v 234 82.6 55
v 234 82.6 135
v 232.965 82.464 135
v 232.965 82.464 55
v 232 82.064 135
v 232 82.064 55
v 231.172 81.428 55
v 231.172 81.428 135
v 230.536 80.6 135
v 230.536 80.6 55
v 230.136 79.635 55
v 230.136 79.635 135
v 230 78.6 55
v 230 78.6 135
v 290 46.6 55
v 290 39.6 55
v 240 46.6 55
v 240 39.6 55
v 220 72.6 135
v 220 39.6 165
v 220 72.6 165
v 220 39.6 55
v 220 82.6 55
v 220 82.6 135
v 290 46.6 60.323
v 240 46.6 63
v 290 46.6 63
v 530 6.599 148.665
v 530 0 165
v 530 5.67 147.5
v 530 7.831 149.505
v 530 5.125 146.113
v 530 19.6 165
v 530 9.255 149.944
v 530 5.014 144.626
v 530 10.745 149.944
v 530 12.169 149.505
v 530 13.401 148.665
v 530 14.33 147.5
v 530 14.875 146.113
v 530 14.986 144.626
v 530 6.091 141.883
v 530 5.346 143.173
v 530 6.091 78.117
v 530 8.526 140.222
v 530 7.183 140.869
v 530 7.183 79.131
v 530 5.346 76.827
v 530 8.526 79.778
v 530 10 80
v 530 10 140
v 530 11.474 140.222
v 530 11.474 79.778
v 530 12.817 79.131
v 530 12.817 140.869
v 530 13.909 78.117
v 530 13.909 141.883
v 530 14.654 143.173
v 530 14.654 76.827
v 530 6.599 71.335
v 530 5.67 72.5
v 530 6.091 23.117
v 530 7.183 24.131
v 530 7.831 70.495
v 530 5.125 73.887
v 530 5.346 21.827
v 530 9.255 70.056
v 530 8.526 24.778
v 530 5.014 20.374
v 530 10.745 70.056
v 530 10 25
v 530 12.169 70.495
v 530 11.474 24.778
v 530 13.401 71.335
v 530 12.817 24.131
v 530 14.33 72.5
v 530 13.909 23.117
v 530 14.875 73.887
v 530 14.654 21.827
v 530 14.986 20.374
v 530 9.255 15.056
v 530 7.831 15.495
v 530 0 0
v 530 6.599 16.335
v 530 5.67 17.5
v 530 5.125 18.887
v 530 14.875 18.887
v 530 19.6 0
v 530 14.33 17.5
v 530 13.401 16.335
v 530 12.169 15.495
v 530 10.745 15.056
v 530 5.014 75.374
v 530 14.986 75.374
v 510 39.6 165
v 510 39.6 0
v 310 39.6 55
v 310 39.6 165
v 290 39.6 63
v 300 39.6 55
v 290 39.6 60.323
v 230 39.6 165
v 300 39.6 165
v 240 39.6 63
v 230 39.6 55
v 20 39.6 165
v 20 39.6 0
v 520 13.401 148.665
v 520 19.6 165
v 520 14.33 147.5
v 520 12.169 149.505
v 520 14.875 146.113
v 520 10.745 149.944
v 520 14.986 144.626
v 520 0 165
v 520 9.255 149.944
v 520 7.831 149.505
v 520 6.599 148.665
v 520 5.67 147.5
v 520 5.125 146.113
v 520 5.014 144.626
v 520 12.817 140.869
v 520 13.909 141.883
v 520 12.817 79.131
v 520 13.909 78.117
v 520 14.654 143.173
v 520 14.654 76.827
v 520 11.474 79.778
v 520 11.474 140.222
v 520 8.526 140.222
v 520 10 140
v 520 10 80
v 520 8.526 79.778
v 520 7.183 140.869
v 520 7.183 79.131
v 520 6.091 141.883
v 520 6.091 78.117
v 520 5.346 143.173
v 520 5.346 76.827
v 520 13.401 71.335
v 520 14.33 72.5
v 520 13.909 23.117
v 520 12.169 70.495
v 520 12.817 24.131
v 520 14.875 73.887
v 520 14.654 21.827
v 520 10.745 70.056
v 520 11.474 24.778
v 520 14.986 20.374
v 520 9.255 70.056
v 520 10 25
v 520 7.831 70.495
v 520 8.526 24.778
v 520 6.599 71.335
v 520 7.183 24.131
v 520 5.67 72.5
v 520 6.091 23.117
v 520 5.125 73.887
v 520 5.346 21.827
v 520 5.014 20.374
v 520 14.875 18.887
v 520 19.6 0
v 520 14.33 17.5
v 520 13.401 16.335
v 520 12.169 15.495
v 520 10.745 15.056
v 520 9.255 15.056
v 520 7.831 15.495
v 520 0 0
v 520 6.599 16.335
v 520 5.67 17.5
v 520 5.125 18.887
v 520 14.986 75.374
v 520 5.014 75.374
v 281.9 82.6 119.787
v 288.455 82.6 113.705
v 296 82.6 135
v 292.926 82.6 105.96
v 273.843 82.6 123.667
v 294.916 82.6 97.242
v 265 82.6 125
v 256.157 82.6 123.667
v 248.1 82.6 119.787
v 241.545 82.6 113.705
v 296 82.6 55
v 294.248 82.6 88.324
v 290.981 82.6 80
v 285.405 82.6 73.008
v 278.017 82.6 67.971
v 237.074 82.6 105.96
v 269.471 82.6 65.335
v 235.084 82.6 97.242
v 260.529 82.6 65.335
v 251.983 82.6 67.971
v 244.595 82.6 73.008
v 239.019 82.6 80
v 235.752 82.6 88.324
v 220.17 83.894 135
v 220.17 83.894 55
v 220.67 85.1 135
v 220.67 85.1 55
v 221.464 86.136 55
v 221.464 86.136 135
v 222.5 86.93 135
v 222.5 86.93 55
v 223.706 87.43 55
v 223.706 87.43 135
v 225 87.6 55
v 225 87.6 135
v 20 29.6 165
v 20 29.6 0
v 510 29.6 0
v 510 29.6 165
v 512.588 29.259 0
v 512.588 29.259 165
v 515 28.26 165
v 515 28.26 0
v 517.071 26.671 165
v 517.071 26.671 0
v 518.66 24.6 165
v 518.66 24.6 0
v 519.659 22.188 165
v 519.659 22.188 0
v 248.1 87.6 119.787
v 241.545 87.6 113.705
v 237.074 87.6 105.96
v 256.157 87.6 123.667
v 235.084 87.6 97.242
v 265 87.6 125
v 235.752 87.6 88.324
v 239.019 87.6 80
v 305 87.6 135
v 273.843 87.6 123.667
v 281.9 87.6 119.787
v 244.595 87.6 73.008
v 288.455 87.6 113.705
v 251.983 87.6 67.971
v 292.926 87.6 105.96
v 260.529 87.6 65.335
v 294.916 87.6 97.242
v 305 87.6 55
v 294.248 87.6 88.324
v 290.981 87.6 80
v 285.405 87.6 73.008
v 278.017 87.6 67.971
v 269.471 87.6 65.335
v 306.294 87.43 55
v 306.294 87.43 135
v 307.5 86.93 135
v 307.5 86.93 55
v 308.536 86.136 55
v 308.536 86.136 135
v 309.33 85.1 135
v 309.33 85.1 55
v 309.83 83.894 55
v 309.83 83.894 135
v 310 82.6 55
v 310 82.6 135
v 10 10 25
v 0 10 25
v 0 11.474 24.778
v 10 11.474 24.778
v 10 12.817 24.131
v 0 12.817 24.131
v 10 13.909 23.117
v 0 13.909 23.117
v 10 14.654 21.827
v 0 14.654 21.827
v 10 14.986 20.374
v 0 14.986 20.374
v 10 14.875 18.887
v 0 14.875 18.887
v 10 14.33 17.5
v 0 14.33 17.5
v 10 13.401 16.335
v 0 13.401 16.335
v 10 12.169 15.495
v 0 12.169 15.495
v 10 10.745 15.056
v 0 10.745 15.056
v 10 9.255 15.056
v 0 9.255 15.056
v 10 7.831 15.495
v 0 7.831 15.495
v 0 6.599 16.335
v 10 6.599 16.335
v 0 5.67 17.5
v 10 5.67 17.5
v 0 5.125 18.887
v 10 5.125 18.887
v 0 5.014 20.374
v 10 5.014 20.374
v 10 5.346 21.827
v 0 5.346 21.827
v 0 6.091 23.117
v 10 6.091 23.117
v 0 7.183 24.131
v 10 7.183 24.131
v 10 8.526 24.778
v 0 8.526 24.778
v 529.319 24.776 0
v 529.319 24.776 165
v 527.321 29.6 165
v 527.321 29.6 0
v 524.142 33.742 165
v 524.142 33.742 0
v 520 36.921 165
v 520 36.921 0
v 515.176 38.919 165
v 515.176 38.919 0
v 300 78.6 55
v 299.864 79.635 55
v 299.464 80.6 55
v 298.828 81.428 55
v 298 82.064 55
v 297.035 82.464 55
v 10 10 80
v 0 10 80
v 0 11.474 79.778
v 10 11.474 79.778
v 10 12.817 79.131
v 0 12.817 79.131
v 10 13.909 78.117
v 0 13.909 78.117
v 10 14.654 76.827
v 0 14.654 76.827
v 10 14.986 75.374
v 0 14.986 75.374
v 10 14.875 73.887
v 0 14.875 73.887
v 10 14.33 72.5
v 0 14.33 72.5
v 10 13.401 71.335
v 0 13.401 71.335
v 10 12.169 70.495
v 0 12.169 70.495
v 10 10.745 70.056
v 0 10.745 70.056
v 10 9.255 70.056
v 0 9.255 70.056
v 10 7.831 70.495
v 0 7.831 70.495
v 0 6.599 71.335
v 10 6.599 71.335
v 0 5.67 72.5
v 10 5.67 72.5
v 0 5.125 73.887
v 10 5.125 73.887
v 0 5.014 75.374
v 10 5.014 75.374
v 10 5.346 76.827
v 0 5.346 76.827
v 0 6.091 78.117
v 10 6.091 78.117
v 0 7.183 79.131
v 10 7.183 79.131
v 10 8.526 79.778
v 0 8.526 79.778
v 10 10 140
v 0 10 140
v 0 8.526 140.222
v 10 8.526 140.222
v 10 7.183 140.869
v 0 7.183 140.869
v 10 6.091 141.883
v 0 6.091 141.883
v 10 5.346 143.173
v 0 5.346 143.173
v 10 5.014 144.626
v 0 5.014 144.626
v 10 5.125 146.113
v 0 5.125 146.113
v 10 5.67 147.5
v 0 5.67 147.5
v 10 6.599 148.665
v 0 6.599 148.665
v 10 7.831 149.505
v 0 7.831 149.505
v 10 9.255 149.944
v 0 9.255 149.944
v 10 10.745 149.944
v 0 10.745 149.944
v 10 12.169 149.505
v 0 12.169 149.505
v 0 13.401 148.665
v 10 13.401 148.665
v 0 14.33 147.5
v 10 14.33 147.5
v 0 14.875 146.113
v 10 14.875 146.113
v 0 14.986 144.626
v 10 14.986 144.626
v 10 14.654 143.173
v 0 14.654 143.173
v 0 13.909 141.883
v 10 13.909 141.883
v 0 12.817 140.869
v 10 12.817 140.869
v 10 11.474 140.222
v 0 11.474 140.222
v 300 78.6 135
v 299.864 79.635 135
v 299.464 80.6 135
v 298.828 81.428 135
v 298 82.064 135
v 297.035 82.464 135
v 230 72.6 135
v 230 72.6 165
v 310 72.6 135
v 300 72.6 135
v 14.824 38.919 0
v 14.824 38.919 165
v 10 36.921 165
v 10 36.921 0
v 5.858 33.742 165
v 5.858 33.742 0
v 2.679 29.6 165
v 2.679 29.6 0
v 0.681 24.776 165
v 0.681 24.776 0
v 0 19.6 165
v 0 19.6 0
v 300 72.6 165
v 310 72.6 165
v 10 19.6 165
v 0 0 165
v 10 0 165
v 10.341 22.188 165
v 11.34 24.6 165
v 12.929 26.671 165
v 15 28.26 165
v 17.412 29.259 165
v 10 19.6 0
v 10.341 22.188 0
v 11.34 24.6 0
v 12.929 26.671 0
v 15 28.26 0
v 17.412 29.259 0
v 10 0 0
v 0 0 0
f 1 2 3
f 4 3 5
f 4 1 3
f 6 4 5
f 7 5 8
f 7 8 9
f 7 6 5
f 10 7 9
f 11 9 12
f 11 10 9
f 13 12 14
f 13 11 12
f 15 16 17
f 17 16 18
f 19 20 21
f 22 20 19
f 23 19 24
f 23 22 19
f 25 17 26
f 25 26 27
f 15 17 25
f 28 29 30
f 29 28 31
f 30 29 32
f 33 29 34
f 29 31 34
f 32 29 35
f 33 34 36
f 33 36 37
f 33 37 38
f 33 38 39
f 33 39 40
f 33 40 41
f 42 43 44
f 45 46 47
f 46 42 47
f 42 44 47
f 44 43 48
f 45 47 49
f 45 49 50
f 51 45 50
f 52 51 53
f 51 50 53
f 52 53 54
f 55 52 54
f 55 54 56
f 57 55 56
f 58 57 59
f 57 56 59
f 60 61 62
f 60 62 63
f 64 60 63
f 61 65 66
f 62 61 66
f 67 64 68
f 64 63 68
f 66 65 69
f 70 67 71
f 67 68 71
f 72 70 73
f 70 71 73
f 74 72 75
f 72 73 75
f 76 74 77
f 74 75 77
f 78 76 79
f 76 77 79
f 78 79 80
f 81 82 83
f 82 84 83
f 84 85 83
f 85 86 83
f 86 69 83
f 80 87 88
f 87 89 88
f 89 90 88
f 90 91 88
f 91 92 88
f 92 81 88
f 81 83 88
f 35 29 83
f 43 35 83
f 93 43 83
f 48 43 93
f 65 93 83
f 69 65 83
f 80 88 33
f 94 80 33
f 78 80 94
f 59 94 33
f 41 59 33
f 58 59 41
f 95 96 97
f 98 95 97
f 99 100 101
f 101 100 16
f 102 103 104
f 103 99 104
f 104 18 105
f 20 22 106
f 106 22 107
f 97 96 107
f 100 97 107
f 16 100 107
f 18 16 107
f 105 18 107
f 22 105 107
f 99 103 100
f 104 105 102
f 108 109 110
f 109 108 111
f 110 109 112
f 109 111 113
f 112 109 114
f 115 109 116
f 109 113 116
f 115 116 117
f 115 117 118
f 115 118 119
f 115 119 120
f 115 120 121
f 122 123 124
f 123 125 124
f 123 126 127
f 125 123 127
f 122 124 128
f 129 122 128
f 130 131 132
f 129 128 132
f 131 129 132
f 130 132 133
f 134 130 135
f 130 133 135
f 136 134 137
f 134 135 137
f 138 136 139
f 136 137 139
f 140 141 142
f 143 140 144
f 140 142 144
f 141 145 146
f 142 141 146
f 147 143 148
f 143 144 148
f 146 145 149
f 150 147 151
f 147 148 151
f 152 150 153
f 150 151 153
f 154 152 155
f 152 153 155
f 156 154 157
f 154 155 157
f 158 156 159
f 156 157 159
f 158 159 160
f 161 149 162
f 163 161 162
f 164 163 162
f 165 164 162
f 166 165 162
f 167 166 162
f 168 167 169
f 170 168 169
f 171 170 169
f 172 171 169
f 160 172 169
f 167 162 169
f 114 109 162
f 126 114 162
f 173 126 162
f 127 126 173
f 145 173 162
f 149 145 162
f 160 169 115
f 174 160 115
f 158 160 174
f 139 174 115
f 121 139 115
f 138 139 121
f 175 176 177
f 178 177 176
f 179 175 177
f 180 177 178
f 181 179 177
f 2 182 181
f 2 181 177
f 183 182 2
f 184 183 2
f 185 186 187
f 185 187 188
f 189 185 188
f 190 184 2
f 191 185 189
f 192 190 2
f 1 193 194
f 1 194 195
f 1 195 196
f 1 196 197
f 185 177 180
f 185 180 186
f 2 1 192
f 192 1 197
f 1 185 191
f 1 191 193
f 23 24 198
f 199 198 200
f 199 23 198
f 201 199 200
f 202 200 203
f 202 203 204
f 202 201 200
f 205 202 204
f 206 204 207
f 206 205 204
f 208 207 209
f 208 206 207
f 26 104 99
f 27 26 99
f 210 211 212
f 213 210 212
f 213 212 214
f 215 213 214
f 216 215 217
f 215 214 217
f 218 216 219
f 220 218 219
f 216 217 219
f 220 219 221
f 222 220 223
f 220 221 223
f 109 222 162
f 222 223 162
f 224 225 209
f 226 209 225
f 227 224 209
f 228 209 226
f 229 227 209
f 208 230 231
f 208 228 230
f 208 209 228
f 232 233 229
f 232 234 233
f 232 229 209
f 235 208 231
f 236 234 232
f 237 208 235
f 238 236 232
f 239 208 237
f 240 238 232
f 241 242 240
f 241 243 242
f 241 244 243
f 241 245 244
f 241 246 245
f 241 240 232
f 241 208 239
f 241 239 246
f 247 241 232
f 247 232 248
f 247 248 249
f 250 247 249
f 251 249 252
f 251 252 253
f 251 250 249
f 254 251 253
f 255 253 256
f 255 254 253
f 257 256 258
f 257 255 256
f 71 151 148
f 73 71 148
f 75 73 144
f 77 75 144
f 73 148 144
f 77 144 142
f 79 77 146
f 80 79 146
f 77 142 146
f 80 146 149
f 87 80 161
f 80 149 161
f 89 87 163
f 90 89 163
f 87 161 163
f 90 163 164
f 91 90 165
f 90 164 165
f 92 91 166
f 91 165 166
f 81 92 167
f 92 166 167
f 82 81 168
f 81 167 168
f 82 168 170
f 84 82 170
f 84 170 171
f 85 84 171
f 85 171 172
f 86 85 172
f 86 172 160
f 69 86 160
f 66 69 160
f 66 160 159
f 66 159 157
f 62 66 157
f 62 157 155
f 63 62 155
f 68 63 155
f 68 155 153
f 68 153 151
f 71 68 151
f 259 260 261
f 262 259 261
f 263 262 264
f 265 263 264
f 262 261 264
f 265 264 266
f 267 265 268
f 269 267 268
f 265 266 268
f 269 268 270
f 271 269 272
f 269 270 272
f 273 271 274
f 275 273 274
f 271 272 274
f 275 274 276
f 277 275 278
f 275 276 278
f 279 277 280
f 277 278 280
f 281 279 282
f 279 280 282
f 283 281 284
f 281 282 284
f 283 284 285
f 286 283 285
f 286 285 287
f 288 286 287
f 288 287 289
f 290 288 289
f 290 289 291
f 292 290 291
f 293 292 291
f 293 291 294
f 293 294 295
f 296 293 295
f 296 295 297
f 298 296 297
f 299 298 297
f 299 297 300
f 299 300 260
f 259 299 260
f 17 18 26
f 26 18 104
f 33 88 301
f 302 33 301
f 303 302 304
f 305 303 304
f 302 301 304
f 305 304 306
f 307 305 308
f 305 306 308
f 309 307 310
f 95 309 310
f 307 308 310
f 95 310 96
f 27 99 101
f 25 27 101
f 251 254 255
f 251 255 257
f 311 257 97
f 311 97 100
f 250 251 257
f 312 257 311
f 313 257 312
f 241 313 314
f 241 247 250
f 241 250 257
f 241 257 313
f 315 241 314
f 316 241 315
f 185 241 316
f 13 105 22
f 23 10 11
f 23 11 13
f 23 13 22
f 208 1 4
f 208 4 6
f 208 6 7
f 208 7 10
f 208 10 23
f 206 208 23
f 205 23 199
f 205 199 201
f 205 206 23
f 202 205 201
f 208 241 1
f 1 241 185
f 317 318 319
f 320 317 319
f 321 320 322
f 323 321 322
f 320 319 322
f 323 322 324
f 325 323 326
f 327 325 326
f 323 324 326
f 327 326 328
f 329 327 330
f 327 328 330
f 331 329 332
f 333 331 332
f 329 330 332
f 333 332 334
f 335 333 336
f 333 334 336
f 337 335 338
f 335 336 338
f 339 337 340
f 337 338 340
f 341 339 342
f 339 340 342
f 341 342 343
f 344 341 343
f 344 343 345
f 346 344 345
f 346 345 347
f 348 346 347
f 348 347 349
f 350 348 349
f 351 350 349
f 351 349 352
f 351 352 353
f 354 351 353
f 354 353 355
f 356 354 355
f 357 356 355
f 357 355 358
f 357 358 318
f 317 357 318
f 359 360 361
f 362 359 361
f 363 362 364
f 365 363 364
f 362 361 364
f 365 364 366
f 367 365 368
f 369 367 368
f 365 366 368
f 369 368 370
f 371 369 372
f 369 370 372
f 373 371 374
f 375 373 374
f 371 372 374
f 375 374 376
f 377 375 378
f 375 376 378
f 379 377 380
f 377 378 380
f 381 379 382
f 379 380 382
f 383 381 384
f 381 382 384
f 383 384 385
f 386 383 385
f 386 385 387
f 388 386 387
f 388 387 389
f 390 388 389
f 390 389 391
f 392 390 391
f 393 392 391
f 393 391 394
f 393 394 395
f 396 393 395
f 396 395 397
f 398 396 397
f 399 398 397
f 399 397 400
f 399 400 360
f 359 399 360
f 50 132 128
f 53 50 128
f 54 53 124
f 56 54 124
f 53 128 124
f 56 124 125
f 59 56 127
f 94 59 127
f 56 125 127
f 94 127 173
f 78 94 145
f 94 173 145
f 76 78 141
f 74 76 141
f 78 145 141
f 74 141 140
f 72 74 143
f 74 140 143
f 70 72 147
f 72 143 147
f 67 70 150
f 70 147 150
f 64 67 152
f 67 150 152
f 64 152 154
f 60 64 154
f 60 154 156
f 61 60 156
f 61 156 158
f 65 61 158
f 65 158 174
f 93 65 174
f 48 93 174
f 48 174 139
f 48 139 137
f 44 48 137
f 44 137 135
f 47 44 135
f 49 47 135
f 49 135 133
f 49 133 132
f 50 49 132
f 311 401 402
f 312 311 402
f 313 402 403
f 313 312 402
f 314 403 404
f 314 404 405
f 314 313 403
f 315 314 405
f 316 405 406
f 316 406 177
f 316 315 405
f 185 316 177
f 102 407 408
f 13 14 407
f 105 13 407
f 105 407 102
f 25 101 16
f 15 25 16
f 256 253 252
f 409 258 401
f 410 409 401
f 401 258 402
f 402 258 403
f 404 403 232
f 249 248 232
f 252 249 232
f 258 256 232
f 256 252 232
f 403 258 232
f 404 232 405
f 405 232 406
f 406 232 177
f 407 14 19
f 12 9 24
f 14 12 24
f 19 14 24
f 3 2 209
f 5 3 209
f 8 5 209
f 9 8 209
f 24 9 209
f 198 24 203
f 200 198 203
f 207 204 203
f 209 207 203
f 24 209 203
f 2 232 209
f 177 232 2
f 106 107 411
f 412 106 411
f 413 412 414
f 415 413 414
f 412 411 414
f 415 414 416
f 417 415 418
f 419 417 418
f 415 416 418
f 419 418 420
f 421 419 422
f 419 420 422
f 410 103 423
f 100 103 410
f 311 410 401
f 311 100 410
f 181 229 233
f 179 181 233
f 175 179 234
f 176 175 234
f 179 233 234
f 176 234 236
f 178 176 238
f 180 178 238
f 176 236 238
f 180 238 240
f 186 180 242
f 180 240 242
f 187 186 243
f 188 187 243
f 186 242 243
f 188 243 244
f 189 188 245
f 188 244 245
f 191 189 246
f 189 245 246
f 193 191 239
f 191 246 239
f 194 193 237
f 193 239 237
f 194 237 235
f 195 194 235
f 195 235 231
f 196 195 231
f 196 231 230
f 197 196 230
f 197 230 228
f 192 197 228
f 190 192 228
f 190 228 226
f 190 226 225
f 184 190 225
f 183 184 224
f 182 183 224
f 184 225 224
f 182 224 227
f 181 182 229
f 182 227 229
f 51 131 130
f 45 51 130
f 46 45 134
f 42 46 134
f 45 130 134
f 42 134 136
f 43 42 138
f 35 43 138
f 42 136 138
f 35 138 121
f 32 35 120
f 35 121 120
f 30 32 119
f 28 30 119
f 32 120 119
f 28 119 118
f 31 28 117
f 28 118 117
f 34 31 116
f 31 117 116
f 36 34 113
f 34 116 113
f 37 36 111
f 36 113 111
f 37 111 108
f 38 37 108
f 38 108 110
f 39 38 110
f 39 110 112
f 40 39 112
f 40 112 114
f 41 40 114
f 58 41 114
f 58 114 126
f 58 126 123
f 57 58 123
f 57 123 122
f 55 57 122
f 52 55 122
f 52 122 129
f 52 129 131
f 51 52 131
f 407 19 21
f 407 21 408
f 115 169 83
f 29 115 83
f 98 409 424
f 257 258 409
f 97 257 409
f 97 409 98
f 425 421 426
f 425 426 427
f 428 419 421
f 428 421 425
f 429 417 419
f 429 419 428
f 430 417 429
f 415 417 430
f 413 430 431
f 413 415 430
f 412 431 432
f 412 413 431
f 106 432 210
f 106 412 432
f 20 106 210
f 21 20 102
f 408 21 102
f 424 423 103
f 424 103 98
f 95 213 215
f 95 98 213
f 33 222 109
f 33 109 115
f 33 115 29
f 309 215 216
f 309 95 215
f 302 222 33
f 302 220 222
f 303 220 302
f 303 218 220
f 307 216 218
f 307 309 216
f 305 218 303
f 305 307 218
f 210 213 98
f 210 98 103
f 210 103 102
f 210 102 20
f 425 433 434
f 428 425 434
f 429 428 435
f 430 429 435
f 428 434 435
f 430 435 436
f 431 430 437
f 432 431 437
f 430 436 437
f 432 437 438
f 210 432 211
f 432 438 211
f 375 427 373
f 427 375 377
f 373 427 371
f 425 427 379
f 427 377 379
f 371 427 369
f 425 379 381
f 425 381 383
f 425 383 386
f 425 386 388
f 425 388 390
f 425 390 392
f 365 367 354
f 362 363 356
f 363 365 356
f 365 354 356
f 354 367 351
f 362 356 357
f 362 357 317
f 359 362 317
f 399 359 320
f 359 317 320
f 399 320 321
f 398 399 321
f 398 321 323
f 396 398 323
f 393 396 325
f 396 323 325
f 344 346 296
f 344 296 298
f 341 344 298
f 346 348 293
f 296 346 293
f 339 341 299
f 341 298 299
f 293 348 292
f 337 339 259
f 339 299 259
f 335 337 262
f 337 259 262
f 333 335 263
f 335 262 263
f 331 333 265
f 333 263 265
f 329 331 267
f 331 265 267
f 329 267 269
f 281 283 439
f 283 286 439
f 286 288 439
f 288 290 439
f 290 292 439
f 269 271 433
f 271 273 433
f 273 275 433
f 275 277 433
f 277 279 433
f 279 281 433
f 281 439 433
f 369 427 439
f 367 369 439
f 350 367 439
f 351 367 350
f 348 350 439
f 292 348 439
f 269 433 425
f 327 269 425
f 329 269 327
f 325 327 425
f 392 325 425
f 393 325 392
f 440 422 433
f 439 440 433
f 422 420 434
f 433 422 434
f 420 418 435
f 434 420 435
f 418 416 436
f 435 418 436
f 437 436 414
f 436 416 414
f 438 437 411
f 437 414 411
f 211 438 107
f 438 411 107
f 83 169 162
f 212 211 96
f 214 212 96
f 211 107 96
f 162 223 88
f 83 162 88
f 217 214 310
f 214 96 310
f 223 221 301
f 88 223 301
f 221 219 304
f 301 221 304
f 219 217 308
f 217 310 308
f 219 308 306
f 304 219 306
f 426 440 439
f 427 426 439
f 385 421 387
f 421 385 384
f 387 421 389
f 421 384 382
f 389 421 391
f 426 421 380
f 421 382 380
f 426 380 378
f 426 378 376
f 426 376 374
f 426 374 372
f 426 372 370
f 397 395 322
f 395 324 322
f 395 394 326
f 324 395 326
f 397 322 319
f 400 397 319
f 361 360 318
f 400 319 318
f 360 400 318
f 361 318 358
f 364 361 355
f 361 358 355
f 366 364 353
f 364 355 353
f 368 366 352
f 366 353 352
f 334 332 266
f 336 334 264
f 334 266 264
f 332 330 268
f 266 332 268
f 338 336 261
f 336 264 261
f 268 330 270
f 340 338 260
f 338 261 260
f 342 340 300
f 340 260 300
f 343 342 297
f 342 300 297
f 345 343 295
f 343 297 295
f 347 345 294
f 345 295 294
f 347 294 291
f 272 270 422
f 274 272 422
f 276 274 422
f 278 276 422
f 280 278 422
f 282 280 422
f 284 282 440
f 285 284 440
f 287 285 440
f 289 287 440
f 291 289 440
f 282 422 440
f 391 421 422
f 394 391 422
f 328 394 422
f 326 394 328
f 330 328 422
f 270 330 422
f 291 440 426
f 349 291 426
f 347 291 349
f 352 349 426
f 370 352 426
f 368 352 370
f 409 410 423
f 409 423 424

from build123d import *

# Parameters (mm, degrees)
BOSS_EXTRUDE2_DEPTH = 165
SKETCH2_R           = 5
CUT_EXTRUDE1_DEPTH  = 557.500817609
SKETCH3_W           = 10
SKETCH3_H           = 110
BOSS_EXTRUDE3_DEPTH = 33
BOSS_EXTRUDE4_DEPTH = 80
SKETCH5_R           = 30
CUT_EXTRUDE2_DEPTH  = 5
BOSS_EXTRUDE5_DEPTH = 7


with BuildPart() as part:
    # Sketch1 → Boss-Extrude2 (new body)
    with BuildSketch(Plane.XY):
        with BuildLine():
            Line((20, 29.6), (510, 29.6))
            ThreePointArc((510, 29.6), (517.071067812, 26.671067812), (520, 19.6))
            Line((520, 19.6), (520, 0))
            Line((520, 0), (530, 0))
            Line((530, 0), (530, 19.6))
            ThreePointArc((530, 19.6), (524.142135624, 33.742135624), (510, 39.6))
            Line((510, 39.6), (20, 39.6))
            ThreePointArc((20, 39.6), (5.857864376, 33.742135624), (0, 19.6))
            Line((0, 19.6), (0, 0))
            Line((0, 0), (10, 0))
            Line((10, 0), (10, 19.6))
            ThreePointArc((10, 19.6), (12.928932188, 26.671067812), (20, 29.6))
        make_face()
    extrude(amount=BOSS_EXTRUDE2_DEPTH)

    # Sketch2 → Cut-Extrude1 (cut, through all)
    with BuildSketch(Plane.ZY):
        with Locations((20, 10)):
            Circle(SKETCH2_R)
        with Locations(Location((145, 10, 0), (0, 0, 180))):
            Circle(SKETCH2_R)
        with Locations((75, 10)):
            Circle(SKETCH2_R)
    extrude(amount=-CUT_EXTRUDE1_DEPTH, mode=Mode.SUBTRACT)

    # Sketch3 → Boss-Extrude3 (add)
    with BuildSketch(Plane(origin=(0, 39.6, 0), x_dir=(1, 0, 0), z_dir=(0, 1, 0))):
        with Locations((225, -110)):
            Rectangle(SKETCH3_W, SKETCH3_H)
        with Locations((305, -110)):
            Rectangle(SKETCH3_W, SKETCH3_H)
    extrude(amount=BOSS_EXTRUDE3_DEPTH)

    # Sketch4 → Boss-Extrude4 (add)
    with BuildSketch(Plane(origin=(0, 0, 55), x_dir=(-1, 0, 0), z_dir=(0, 0, -1))):
        with BuildLine():
            Line((-300, 72.6), (-300, 78.6))
            ThreePointArc((-300, 78.6), (-298.828427125, 81.428427125), (-296, 82.6))
            Line((-296, 82.6), (-234, 82.6))
            ThreePointArc((-234, 82.6), (-231.171572875, 81.428427125), (-230, 78.6))
            Line((-230, 78.6), (-230, 72.6))
            Line((-230, 72.6), (-220, 72.6))
            Line((-220, 72.6), (-220, 82.6))
            ThreePointArc((-220, 82.6), (-221.464466094, 86.135533906), (-225, 87.6))
            Line((-225, 87.6), (-305, 87.6))
            ThreePointArc((-305, 87.6), (-308.535533906, 86.135533906), (-310, 82.6))
            Line((-310, 82.6), (-310, 72.6))
            Line((-310, 72.6), (-300, 72.6))
        make_face()
    extrude(amount=-BOSS_EXTRUDE4_DEPTH)

    # Sketch5 → Cut-Extrude2 (cut)
    with BuildSketch(Plane(origin=(0, 87.6, 0), x_dir=(1, 0, 0), z_dir=(0, 1, 0))):
        with Locations(Location((265, -95, 0), (0, 0, 270))):
            Circle(SKETCH5_R)
    extrude(amount=-CUT_EXTRUDE2_DEPTH, mode=Mode.SUBTRACT)

    # 3DSketch2 → Boss-Extrude5 (add)
    with BuildSketch(Plane(origin=(290, 39.6, 55), x_dir=(-0.9874406319167054, 0, 0.1579905011066729), z_dir=(0, -1, 0))):
        Polygon((0, 0), (49.372031596, 7.899525055), (50.635955605, 0), (1.263924009, -7.899525055), (0.840997387, -5.256233666), align=None)
    extrude(amount=-BOSS_EXTRUDE5_DEPTH)


solid = part.part
